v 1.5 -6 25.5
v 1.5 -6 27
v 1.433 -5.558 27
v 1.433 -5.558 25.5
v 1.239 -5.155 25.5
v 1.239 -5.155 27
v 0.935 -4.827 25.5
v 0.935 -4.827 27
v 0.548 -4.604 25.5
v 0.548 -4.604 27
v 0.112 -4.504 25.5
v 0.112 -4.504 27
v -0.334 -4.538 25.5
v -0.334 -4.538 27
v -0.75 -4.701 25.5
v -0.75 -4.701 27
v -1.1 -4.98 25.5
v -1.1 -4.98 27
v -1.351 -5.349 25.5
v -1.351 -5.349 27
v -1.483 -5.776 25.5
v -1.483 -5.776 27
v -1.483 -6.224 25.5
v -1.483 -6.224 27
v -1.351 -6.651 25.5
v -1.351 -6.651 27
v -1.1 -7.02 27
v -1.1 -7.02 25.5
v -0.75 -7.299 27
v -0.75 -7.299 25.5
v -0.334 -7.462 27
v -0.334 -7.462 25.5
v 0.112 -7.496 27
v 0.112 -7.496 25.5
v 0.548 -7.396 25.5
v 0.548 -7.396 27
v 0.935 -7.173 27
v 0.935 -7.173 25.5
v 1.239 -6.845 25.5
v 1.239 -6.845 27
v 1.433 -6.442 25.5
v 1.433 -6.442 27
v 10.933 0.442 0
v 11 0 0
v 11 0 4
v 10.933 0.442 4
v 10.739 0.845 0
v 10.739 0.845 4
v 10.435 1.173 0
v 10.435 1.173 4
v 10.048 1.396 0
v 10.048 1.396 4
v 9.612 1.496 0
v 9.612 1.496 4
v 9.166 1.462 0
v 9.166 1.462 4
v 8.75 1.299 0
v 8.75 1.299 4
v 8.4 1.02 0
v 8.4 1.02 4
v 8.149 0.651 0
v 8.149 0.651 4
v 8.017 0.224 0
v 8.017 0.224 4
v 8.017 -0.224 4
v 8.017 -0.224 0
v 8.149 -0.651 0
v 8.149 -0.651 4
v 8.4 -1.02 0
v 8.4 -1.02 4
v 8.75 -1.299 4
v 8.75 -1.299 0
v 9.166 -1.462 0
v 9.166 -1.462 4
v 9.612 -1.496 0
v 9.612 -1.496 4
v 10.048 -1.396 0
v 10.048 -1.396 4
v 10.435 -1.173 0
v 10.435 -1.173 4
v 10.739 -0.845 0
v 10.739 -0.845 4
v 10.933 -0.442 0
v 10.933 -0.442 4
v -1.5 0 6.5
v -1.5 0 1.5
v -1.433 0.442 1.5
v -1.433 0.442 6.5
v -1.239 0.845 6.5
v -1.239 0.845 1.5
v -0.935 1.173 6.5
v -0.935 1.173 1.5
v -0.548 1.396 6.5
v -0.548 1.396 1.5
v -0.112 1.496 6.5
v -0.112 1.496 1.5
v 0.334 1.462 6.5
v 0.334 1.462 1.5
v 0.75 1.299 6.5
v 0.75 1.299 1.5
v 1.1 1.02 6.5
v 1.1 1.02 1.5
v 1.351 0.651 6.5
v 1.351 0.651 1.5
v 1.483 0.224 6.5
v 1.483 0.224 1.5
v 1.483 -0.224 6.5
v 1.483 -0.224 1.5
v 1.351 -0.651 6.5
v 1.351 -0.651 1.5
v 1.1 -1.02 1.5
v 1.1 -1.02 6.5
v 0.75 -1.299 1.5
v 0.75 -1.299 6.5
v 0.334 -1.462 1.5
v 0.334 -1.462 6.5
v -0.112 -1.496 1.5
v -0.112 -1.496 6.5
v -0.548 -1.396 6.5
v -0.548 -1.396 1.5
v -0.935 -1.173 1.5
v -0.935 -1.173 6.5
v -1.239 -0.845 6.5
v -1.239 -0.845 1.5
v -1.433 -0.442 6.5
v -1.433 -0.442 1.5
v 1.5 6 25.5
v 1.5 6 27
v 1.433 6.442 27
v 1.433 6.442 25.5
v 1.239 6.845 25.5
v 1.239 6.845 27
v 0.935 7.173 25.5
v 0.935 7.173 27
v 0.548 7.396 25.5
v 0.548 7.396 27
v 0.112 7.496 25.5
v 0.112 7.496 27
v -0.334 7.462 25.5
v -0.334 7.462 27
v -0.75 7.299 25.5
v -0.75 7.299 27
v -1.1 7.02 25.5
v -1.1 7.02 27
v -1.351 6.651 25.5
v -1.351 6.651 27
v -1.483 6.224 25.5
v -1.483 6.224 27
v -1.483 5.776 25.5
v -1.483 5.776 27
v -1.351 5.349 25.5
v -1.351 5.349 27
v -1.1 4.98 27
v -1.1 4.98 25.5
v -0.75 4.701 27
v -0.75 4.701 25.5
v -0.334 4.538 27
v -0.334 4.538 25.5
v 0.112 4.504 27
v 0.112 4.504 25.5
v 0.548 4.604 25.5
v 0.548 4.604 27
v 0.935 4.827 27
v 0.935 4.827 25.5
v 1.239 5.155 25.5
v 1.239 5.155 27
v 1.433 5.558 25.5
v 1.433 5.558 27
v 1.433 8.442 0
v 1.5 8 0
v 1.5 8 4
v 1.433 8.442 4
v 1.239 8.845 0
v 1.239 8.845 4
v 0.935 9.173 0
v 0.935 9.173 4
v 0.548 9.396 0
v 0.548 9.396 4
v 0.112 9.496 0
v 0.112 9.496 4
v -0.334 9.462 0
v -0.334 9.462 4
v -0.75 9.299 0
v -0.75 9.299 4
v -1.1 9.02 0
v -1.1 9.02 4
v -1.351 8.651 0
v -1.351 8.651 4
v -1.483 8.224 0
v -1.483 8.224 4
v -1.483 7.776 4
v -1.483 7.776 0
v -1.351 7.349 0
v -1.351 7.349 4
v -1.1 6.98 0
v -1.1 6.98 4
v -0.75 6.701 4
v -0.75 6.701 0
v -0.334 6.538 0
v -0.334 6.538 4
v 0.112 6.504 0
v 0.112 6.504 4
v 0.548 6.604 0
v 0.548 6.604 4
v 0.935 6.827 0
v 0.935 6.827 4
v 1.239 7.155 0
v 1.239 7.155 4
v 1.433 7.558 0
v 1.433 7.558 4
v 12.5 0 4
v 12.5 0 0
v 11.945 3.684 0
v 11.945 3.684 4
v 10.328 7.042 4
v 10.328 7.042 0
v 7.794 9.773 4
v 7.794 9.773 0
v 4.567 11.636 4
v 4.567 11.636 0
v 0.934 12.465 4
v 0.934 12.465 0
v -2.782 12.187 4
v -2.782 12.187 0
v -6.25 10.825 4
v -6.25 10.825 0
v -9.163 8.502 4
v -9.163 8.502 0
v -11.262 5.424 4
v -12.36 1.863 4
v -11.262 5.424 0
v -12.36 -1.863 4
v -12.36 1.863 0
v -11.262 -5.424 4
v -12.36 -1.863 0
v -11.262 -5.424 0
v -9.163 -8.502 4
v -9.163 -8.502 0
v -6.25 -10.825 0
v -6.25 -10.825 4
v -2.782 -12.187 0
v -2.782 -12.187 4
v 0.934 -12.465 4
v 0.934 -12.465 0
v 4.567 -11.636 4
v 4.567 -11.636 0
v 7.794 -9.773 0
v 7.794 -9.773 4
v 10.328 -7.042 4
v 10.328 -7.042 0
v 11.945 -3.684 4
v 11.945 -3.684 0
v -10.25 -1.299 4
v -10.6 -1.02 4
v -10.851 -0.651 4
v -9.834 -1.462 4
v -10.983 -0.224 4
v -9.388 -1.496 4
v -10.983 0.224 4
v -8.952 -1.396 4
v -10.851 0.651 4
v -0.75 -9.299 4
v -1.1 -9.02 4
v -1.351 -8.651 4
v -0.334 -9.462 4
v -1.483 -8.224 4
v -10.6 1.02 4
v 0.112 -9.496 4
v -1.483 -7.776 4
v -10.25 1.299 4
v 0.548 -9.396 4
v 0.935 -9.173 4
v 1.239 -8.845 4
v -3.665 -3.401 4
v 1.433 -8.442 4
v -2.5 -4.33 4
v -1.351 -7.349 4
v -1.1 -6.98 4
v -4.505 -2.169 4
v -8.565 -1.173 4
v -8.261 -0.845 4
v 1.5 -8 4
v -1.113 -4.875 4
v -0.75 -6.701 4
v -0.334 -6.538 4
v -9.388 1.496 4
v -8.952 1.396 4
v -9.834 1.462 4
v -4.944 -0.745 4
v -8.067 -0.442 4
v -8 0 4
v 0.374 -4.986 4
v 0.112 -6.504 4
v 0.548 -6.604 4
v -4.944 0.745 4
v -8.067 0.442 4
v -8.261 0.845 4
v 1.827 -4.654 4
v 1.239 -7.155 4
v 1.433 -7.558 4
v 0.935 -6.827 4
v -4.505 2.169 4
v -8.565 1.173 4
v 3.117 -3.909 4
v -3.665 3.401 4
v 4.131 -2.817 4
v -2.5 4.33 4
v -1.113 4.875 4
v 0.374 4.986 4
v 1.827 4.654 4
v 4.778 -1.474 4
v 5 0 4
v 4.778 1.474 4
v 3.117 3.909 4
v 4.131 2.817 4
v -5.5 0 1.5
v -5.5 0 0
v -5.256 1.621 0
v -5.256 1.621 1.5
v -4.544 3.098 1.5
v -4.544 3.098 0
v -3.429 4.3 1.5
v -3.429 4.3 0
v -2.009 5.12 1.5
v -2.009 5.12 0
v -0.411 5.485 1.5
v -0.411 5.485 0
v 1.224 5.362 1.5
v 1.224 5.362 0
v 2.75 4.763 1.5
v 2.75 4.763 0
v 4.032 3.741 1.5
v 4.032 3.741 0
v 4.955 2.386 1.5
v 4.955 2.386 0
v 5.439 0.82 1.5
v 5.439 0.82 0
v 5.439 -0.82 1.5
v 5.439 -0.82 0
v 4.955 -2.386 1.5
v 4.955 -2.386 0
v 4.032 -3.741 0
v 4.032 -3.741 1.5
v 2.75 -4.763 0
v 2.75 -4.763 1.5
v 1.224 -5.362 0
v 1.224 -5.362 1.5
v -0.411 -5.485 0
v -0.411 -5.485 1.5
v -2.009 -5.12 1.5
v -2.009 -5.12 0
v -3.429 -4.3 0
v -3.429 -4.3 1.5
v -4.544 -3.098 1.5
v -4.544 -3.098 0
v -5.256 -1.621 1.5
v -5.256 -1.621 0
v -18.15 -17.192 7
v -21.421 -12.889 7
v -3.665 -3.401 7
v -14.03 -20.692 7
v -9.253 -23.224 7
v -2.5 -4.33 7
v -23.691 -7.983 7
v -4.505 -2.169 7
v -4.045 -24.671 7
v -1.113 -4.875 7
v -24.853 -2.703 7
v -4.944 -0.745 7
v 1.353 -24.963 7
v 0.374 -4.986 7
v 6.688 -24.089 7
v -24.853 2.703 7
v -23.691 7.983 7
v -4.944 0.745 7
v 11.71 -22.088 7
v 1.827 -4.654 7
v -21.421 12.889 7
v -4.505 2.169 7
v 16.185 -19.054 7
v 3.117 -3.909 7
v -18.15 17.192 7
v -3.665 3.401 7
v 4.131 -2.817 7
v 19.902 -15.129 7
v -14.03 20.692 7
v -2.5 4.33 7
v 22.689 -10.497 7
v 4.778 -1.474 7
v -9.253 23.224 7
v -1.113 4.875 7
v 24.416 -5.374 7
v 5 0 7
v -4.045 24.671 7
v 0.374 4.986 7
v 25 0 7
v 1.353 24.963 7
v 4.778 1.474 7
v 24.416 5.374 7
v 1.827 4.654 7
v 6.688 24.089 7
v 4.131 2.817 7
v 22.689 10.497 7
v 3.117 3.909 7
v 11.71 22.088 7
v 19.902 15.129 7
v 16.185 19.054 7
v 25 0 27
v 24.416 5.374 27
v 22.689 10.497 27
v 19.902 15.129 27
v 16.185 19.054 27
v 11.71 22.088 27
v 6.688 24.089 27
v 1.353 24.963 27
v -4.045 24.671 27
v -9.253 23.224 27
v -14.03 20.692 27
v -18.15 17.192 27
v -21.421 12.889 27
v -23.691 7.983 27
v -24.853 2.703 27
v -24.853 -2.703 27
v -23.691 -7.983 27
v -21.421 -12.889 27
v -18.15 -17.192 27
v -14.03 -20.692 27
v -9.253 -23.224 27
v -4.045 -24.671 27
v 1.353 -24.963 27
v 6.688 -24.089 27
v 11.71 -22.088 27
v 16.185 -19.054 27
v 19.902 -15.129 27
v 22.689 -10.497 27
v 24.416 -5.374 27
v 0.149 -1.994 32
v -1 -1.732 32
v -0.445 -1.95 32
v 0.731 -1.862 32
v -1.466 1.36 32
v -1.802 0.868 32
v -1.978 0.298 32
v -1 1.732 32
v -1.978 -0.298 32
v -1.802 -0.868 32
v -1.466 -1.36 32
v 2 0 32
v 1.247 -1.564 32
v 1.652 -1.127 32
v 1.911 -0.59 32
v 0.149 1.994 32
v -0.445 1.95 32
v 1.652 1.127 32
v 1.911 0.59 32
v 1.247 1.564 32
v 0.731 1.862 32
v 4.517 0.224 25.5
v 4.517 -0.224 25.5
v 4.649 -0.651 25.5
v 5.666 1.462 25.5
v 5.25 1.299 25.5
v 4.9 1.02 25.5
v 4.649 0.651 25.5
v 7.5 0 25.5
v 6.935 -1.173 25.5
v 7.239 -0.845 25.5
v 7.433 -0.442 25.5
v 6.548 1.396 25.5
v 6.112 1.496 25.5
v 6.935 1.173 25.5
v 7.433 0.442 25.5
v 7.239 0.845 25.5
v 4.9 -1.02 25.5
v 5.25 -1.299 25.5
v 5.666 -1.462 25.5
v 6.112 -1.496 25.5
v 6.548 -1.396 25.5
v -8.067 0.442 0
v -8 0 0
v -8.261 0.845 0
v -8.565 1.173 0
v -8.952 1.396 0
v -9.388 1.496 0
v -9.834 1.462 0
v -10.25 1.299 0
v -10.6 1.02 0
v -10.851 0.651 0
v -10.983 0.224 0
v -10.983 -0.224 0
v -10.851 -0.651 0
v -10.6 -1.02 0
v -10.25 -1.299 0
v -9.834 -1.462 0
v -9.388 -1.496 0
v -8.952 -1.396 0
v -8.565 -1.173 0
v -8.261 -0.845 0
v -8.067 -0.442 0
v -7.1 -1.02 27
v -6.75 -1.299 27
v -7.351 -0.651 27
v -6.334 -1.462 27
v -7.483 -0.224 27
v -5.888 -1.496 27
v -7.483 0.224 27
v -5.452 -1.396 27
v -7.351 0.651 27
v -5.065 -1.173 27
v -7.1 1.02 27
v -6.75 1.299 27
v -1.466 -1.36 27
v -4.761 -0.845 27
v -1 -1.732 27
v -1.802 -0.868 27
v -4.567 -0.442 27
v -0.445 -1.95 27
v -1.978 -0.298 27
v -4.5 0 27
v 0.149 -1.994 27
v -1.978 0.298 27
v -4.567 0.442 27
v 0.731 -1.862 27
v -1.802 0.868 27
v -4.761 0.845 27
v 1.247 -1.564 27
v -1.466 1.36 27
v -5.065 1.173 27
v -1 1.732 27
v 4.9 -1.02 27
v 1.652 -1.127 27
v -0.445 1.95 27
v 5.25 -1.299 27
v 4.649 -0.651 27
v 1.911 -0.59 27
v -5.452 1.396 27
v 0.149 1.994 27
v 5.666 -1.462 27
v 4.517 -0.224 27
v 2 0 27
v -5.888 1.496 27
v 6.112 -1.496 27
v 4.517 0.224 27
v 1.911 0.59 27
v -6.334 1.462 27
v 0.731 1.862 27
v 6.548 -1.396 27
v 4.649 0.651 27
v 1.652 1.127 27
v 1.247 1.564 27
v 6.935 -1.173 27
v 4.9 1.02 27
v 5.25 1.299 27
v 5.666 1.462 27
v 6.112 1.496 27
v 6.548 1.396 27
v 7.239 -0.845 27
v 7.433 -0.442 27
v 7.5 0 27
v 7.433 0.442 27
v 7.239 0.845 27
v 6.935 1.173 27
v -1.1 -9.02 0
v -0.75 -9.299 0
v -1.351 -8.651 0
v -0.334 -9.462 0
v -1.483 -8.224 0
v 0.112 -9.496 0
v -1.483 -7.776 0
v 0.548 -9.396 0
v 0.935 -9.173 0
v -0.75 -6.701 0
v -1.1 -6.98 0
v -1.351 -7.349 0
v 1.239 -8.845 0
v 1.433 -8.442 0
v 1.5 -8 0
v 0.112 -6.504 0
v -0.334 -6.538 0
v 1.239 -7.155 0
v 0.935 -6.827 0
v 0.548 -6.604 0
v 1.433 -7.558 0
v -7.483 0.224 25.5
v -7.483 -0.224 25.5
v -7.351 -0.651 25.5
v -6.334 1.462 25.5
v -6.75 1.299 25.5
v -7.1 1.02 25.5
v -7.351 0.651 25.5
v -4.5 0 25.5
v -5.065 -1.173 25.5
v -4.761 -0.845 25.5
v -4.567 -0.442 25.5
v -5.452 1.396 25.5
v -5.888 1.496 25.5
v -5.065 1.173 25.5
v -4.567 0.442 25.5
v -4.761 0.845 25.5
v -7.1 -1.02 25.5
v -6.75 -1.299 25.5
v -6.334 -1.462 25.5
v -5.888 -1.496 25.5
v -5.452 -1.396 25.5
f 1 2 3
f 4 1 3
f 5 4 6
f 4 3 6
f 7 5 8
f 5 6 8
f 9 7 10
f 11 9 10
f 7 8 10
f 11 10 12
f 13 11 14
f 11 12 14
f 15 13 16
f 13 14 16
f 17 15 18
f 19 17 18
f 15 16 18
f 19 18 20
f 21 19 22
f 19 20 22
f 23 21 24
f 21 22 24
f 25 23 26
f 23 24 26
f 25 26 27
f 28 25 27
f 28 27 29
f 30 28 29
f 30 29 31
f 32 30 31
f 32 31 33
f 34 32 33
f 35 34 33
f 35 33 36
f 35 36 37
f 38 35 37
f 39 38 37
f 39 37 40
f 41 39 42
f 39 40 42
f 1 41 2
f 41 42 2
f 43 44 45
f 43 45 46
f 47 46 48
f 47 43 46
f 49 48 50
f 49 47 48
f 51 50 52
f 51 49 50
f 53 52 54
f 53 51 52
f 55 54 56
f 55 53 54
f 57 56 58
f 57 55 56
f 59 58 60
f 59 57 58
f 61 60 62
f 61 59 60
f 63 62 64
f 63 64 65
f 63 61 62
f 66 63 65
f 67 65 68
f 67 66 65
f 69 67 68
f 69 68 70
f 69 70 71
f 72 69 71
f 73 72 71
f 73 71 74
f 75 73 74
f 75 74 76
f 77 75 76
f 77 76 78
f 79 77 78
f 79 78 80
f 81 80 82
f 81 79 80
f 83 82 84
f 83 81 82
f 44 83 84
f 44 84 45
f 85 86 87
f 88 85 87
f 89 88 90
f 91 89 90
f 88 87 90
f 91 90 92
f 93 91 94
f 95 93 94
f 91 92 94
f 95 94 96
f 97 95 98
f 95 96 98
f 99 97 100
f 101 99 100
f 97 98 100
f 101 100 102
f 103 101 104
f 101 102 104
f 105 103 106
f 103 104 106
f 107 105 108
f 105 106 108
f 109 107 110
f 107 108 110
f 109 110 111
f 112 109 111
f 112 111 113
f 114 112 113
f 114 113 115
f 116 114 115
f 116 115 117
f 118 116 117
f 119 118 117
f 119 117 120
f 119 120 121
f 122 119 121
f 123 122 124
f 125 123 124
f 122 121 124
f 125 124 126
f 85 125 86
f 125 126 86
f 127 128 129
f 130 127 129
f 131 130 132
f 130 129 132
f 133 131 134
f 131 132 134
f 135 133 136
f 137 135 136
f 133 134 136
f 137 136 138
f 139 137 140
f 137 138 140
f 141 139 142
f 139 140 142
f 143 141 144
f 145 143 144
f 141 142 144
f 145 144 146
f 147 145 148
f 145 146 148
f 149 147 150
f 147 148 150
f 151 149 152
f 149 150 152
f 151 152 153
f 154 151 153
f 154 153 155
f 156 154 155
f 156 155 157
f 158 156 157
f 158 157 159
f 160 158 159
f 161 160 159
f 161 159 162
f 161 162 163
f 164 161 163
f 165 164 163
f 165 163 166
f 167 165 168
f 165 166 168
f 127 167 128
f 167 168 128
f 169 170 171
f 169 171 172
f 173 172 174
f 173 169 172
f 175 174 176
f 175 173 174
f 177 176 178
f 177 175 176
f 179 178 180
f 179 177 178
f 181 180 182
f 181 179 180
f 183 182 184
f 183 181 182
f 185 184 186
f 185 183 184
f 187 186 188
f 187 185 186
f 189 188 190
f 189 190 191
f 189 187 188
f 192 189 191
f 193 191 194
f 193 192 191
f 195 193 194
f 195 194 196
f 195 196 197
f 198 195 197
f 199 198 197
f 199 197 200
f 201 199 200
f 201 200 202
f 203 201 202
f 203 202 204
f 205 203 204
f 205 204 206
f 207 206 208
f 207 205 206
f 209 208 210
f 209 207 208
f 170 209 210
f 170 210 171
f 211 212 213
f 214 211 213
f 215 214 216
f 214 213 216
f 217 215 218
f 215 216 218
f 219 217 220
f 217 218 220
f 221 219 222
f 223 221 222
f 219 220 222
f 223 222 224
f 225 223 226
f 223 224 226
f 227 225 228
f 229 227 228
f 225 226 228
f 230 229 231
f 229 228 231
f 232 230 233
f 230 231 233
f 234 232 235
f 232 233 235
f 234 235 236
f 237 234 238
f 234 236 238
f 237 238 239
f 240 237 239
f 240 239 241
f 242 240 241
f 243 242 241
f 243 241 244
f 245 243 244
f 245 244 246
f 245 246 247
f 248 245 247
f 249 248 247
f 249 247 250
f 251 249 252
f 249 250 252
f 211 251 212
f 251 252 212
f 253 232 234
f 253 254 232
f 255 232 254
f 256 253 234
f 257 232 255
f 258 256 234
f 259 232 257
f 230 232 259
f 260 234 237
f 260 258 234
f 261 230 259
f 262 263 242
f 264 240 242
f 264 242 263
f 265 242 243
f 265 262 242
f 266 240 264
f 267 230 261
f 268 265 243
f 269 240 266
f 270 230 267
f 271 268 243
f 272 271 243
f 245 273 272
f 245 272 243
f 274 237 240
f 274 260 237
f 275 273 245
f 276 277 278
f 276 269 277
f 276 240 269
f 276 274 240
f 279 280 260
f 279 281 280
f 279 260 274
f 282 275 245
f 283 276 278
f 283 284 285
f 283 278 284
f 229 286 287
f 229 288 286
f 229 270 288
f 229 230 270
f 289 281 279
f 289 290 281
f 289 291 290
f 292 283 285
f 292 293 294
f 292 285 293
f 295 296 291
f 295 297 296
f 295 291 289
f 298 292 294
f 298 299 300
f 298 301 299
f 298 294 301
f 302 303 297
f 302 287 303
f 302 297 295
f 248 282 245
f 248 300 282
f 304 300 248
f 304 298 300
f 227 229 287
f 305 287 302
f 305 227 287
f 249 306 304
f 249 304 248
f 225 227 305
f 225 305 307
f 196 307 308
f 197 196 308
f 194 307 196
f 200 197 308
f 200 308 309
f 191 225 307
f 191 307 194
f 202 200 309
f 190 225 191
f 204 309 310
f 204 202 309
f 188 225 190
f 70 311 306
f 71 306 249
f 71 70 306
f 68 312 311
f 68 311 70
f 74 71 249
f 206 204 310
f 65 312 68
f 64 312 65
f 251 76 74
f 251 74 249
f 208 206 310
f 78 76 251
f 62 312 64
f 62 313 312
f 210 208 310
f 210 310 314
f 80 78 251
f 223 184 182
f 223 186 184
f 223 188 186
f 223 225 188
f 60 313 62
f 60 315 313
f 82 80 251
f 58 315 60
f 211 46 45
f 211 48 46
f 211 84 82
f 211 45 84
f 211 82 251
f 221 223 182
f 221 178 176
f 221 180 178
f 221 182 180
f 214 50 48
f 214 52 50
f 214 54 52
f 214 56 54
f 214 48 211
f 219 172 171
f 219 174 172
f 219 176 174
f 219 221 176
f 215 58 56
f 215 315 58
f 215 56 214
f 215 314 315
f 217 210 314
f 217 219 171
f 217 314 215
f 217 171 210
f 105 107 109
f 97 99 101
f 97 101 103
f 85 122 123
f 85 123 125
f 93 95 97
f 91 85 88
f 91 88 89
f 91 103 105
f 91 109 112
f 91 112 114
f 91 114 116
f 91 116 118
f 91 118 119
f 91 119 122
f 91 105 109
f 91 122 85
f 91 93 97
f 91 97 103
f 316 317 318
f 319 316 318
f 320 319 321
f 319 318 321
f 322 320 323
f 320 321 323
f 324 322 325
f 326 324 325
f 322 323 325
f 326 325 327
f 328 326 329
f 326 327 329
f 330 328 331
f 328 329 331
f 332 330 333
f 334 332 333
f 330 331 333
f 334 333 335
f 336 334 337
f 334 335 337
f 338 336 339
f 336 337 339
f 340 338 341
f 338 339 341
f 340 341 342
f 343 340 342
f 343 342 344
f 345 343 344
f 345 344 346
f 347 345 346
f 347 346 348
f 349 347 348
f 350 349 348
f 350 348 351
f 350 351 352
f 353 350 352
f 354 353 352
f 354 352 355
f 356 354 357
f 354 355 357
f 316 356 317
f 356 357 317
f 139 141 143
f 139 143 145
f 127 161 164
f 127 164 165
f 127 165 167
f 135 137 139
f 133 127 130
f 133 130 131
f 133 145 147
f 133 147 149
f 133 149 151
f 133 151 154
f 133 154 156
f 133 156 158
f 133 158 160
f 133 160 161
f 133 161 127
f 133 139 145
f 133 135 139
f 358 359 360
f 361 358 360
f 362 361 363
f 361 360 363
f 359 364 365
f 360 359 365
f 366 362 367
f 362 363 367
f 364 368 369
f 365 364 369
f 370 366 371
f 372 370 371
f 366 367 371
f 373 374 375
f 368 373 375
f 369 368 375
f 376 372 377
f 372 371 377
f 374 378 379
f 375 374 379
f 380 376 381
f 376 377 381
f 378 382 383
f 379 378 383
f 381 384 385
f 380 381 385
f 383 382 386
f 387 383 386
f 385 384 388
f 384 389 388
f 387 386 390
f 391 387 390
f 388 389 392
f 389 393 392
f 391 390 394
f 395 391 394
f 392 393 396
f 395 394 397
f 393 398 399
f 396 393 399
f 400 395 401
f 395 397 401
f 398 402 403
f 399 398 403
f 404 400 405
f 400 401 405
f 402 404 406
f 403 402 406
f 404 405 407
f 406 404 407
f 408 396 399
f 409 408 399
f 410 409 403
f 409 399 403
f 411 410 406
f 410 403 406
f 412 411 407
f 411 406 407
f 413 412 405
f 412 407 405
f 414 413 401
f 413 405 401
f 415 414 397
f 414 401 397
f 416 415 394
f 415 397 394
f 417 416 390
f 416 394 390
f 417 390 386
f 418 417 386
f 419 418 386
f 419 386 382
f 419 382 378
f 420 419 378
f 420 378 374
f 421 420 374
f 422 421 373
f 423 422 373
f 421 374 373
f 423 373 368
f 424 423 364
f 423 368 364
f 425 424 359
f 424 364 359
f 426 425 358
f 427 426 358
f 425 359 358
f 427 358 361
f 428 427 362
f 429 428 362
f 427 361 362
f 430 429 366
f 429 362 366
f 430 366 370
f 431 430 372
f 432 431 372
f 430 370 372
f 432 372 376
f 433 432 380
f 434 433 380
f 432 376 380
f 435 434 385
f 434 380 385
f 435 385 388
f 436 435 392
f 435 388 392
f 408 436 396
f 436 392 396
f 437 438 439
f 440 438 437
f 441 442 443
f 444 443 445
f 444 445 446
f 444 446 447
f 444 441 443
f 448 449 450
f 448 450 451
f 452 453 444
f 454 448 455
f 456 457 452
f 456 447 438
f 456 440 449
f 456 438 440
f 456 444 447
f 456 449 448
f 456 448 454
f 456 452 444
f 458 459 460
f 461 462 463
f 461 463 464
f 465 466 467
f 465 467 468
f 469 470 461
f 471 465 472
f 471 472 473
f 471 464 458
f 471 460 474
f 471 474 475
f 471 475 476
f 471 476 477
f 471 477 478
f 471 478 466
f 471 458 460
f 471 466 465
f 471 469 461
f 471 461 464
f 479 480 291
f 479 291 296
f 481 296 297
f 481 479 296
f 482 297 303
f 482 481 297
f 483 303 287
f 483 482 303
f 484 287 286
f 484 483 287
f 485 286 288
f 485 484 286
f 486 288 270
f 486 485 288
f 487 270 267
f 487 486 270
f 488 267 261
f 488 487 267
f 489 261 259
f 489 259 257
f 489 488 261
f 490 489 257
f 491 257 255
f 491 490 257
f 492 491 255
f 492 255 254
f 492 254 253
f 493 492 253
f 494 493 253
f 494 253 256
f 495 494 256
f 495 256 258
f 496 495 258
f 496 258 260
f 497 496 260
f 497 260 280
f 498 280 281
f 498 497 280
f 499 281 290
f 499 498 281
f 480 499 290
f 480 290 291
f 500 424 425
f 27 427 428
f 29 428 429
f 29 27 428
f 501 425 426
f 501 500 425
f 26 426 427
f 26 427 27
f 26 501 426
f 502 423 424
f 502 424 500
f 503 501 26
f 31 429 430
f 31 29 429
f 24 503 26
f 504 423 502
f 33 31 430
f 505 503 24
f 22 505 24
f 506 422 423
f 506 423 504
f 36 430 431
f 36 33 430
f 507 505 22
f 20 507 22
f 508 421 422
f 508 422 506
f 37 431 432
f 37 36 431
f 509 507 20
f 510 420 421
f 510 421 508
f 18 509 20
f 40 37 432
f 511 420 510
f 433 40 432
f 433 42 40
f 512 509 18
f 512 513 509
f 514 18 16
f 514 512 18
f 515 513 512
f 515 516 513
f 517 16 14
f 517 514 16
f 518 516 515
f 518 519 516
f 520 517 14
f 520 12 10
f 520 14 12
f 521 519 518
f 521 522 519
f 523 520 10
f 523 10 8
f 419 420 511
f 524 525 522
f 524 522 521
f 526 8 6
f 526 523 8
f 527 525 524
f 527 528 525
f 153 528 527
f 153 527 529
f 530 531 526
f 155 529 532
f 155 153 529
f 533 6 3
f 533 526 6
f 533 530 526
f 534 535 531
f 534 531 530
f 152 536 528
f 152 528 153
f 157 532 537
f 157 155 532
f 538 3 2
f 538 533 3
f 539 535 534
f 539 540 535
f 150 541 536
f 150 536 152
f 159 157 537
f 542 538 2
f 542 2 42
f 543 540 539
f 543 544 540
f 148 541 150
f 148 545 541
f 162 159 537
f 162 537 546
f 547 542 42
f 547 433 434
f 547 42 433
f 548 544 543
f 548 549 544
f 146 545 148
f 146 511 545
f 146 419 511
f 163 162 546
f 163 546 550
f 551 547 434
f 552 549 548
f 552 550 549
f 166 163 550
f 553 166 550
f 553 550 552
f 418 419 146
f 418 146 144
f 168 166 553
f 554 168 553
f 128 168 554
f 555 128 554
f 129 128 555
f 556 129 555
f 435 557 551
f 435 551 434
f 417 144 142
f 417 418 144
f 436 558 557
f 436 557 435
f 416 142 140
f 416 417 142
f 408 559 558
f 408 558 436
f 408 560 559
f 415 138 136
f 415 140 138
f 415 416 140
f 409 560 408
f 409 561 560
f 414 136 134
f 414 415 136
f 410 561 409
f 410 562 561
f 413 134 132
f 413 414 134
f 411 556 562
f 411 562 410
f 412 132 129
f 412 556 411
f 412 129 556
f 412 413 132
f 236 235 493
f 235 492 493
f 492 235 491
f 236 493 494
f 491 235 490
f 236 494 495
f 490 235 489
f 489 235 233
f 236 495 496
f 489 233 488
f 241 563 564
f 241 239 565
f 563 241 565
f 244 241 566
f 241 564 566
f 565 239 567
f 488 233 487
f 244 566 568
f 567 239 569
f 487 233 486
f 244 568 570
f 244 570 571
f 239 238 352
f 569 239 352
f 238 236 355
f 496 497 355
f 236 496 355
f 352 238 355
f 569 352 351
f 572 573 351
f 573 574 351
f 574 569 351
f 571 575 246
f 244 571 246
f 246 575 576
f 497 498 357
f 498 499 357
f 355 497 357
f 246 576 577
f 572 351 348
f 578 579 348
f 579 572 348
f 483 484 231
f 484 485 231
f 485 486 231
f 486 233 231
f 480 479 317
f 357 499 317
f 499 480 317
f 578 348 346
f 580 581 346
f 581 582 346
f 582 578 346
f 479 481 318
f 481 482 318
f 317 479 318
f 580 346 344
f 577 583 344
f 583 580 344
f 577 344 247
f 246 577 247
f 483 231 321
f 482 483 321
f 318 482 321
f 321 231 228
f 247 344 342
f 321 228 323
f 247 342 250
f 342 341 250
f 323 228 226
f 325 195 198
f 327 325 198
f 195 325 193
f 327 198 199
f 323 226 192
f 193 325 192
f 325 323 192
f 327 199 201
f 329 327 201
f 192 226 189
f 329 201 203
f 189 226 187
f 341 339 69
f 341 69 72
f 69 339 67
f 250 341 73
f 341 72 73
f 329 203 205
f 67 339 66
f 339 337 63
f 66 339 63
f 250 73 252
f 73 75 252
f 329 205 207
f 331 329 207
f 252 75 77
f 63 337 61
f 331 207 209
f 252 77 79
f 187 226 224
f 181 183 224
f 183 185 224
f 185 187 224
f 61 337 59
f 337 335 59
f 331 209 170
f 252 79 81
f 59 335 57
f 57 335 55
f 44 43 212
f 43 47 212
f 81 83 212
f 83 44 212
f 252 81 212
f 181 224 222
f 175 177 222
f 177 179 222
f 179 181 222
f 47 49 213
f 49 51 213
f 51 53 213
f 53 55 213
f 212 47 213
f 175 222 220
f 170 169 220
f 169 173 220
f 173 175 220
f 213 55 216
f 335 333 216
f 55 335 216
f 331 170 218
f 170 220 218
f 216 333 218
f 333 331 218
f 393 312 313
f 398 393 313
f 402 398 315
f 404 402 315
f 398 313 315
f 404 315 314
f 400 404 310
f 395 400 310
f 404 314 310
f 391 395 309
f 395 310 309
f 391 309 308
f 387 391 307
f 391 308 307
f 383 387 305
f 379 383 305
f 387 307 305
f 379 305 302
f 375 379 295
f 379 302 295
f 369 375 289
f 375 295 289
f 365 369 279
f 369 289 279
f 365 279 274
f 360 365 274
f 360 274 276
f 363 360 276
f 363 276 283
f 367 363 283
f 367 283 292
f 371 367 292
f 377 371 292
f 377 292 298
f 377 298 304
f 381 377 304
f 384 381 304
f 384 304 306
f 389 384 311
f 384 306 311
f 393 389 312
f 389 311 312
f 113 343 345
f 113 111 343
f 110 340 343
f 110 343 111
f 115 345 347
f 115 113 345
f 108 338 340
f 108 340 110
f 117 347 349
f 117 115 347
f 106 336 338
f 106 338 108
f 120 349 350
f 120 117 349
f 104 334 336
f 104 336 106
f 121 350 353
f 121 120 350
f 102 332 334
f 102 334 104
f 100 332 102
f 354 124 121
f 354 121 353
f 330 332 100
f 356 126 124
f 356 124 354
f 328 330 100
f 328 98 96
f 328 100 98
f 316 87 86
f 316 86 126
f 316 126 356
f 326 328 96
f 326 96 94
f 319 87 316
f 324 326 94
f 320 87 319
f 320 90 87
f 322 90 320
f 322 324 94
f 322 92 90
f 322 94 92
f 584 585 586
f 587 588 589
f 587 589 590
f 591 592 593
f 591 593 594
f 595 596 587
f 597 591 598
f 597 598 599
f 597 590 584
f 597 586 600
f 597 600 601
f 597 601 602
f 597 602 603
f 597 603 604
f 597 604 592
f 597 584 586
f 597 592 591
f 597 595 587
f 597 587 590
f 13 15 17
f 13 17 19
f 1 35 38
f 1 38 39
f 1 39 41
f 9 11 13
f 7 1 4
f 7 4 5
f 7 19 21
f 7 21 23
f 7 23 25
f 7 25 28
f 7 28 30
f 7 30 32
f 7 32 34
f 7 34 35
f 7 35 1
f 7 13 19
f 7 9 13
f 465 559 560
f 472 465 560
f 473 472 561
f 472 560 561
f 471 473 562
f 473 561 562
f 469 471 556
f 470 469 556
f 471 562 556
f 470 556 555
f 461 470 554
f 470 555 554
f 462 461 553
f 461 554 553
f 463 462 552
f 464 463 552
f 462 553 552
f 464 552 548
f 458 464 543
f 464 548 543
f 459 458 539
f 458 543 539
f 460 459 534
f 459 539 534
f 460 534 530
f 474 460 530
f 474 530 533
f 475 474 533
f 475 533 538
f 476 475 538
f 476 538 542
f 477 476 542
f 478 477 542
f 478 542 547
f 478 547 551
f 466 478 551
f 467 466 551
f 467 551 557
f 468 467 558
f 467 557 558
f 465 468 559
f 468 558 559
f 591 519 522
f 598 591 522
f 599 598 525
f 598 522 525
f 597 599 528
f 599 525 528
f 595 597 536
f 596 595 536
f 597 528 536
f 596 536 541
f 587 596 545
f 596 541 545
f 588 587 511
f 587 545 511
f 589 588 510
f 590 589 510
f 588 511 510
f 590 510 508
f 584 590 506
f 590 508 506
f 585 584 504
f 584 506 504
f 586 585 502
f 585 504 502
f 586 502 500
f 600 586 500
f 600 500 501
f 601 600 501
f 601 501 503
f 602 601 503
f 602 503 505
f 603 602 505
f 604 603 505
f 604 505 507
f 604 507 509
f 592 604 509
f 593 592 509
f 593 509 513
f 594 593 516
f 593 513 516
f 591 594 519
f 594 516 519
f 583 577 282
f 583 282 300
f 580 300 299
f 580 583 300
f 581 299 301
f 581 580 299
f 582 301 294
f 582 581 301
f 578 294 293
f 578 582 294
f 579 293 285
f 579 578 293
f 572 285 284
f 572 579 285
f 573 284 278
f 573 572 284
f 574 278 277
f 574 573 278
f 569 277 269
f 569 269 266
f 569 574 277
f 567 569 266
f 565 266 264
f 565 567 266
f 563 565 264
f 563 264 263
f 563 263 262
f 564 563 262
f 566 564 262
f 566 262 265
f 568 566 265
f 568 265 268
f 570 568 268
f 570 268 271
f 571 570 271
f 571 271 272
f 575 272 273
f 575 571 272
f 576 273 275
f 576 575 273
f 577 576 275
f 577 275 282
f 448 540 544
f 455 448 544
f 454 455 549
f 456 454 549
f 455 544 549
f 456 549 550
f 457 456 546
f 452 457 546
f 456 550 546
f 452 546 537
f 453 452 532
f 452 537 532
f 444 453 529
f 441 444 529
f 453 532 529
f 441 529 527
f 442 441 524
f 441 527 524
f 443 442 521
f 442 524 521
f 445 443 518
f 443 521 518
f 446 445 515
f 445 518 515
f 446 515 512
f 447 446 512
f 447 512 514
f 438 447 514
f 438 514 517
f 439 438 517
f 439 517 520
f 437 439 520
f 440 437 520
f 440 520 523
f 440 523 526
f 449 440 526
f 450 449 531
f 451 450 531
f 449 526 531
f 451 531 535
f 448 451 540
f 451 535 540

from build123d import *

# Parameters (mm, degrees)
SKETCH1_R           = 12.5
SKETCH1_R_2         = 1.5
BOSS_EXTRUDE1_DEPTH = 4
SKETCH2_R           = 5
BOSS_EXTRUDE2_DEPTH = 3
SKETCH3_R           = 25
BOSS_EXTRUDE3_DEPTH = 20
SKETCH4_R           = 1.5
CUT_EXTRUDE1_DEPTH  = 1.5
SKETCH5_R           = 2
BOSS_EXTRUDE4_DEPTH = 5
SKETCH6_R           = 5.5
CUT_EXTRUDE2_DEPTH  = 1.5
SKETCH7_R           = 1.5
CUT_EXTRUDE3_DEPTH  = 5


with BuildPart() as part:
    # Sketch1 → Boss-Extrude1 (new body)
    with BuildSketch(Plane(origin=(0, 0, 0), x_dir=(0, 1, 0), z_dir=(0, 0, 1))):
        with Locations(Location((0, 0, 0), (0, 0, 270))):
            Circle(SKETCH1_R)
        with Locations(Location((0, 9.5, 0), (0, 0, 270))):
            Circle(SKETCH1_R_2, mode=Mode.SUBTRACT)
        with Locations(Location((-8, 0, 0), (0, 0, 270))):
            Circle(SKETCH1_R_2, mode=Mode.SUBTRACT)
        with Locations(Location((8, 0, 0), (0, 0, 270))):
            Circle(SKETCH1_R_2, mode=Mode.SUBTRACT)
        with Locations(Location((0, -9.5, 0), (0, 0, 270))):
            Circle(SKETCH1_R_2, mode=Mode.SUBTRACT)
    extrude(amount=BOSS_EXTRUDE1_DEPTH)

    # Sketch2 → Boss-Extrude2 (add)
    with BuildSketch(Plane.XY.offset(4)):
        Circle(SKETCH2_R)
    extrude(amount=BOSS_EXTRUDE2_DEPTH)

    # Sketch3 → Boss-Extrude3 (add)
    with BuildSketch(Plane.XY.offset(7)):
        Circle(SKETCH3_R)
    extrude(amount=BOSS_EXTRUDE3_DEPTH)

    # Sketch4 → Cut-Extrude1 (cut, symmetric)
    with BuildSketch(Plane.XY.offset(27)):
        with Locations((0, 6)):
            Circle(SKETCH4_R)
        with Locations((6, 0)):
            Circle(SKETCH4_R)
        with Locations((0, -6)):
            Circle(SKETCH4_R)
        with Locations((-6, 0)):
            Circle(SKETCH4_R)
    extrude(amount=CUT_EXTRUDE1_DEPTH, both=True, mode=Mode.SUBTRACT)

    # Sketch5 → Boss-Extrude4 (add)
    with BuildSketch(Plane.XY.offset(27)):
        Circle(SKETCH5_R)
    extrude(amount=BOSS_EXTRUDE4_DEPTH)

    # Sketch6 → Cut-Extrude2 (cut, symmetric)
    with BuildSketch(Plane(origin=(0, 0, 0), x_dir=(1, 0, 0), z_dir=(0, 0, -1))):
        with Locations(Location((0, 0, 0), (0, 0, 180))):
            Circle(SKETCH6_R)
    extrude(amount=CUT_EXTRUDE2_DEPTH, both=True, mode=Mode.SUBTRACT)

    # Sketch7 → Cut-Extrude3 (cut)
    with BuildSketch(Plane(origin=(0, 0, 1.5), x_dir=(1, 0, 0), z_dir=(0, 0, -1))):
        with Locations(Location((0, 0, 0), (0, 0, 180))):
            Circle(SKETCH7_R)
    extrude(amount=-CUT_EXTRUDE3_DEPTH, mode=Mode.SUBTRACT)


solid = part.part
